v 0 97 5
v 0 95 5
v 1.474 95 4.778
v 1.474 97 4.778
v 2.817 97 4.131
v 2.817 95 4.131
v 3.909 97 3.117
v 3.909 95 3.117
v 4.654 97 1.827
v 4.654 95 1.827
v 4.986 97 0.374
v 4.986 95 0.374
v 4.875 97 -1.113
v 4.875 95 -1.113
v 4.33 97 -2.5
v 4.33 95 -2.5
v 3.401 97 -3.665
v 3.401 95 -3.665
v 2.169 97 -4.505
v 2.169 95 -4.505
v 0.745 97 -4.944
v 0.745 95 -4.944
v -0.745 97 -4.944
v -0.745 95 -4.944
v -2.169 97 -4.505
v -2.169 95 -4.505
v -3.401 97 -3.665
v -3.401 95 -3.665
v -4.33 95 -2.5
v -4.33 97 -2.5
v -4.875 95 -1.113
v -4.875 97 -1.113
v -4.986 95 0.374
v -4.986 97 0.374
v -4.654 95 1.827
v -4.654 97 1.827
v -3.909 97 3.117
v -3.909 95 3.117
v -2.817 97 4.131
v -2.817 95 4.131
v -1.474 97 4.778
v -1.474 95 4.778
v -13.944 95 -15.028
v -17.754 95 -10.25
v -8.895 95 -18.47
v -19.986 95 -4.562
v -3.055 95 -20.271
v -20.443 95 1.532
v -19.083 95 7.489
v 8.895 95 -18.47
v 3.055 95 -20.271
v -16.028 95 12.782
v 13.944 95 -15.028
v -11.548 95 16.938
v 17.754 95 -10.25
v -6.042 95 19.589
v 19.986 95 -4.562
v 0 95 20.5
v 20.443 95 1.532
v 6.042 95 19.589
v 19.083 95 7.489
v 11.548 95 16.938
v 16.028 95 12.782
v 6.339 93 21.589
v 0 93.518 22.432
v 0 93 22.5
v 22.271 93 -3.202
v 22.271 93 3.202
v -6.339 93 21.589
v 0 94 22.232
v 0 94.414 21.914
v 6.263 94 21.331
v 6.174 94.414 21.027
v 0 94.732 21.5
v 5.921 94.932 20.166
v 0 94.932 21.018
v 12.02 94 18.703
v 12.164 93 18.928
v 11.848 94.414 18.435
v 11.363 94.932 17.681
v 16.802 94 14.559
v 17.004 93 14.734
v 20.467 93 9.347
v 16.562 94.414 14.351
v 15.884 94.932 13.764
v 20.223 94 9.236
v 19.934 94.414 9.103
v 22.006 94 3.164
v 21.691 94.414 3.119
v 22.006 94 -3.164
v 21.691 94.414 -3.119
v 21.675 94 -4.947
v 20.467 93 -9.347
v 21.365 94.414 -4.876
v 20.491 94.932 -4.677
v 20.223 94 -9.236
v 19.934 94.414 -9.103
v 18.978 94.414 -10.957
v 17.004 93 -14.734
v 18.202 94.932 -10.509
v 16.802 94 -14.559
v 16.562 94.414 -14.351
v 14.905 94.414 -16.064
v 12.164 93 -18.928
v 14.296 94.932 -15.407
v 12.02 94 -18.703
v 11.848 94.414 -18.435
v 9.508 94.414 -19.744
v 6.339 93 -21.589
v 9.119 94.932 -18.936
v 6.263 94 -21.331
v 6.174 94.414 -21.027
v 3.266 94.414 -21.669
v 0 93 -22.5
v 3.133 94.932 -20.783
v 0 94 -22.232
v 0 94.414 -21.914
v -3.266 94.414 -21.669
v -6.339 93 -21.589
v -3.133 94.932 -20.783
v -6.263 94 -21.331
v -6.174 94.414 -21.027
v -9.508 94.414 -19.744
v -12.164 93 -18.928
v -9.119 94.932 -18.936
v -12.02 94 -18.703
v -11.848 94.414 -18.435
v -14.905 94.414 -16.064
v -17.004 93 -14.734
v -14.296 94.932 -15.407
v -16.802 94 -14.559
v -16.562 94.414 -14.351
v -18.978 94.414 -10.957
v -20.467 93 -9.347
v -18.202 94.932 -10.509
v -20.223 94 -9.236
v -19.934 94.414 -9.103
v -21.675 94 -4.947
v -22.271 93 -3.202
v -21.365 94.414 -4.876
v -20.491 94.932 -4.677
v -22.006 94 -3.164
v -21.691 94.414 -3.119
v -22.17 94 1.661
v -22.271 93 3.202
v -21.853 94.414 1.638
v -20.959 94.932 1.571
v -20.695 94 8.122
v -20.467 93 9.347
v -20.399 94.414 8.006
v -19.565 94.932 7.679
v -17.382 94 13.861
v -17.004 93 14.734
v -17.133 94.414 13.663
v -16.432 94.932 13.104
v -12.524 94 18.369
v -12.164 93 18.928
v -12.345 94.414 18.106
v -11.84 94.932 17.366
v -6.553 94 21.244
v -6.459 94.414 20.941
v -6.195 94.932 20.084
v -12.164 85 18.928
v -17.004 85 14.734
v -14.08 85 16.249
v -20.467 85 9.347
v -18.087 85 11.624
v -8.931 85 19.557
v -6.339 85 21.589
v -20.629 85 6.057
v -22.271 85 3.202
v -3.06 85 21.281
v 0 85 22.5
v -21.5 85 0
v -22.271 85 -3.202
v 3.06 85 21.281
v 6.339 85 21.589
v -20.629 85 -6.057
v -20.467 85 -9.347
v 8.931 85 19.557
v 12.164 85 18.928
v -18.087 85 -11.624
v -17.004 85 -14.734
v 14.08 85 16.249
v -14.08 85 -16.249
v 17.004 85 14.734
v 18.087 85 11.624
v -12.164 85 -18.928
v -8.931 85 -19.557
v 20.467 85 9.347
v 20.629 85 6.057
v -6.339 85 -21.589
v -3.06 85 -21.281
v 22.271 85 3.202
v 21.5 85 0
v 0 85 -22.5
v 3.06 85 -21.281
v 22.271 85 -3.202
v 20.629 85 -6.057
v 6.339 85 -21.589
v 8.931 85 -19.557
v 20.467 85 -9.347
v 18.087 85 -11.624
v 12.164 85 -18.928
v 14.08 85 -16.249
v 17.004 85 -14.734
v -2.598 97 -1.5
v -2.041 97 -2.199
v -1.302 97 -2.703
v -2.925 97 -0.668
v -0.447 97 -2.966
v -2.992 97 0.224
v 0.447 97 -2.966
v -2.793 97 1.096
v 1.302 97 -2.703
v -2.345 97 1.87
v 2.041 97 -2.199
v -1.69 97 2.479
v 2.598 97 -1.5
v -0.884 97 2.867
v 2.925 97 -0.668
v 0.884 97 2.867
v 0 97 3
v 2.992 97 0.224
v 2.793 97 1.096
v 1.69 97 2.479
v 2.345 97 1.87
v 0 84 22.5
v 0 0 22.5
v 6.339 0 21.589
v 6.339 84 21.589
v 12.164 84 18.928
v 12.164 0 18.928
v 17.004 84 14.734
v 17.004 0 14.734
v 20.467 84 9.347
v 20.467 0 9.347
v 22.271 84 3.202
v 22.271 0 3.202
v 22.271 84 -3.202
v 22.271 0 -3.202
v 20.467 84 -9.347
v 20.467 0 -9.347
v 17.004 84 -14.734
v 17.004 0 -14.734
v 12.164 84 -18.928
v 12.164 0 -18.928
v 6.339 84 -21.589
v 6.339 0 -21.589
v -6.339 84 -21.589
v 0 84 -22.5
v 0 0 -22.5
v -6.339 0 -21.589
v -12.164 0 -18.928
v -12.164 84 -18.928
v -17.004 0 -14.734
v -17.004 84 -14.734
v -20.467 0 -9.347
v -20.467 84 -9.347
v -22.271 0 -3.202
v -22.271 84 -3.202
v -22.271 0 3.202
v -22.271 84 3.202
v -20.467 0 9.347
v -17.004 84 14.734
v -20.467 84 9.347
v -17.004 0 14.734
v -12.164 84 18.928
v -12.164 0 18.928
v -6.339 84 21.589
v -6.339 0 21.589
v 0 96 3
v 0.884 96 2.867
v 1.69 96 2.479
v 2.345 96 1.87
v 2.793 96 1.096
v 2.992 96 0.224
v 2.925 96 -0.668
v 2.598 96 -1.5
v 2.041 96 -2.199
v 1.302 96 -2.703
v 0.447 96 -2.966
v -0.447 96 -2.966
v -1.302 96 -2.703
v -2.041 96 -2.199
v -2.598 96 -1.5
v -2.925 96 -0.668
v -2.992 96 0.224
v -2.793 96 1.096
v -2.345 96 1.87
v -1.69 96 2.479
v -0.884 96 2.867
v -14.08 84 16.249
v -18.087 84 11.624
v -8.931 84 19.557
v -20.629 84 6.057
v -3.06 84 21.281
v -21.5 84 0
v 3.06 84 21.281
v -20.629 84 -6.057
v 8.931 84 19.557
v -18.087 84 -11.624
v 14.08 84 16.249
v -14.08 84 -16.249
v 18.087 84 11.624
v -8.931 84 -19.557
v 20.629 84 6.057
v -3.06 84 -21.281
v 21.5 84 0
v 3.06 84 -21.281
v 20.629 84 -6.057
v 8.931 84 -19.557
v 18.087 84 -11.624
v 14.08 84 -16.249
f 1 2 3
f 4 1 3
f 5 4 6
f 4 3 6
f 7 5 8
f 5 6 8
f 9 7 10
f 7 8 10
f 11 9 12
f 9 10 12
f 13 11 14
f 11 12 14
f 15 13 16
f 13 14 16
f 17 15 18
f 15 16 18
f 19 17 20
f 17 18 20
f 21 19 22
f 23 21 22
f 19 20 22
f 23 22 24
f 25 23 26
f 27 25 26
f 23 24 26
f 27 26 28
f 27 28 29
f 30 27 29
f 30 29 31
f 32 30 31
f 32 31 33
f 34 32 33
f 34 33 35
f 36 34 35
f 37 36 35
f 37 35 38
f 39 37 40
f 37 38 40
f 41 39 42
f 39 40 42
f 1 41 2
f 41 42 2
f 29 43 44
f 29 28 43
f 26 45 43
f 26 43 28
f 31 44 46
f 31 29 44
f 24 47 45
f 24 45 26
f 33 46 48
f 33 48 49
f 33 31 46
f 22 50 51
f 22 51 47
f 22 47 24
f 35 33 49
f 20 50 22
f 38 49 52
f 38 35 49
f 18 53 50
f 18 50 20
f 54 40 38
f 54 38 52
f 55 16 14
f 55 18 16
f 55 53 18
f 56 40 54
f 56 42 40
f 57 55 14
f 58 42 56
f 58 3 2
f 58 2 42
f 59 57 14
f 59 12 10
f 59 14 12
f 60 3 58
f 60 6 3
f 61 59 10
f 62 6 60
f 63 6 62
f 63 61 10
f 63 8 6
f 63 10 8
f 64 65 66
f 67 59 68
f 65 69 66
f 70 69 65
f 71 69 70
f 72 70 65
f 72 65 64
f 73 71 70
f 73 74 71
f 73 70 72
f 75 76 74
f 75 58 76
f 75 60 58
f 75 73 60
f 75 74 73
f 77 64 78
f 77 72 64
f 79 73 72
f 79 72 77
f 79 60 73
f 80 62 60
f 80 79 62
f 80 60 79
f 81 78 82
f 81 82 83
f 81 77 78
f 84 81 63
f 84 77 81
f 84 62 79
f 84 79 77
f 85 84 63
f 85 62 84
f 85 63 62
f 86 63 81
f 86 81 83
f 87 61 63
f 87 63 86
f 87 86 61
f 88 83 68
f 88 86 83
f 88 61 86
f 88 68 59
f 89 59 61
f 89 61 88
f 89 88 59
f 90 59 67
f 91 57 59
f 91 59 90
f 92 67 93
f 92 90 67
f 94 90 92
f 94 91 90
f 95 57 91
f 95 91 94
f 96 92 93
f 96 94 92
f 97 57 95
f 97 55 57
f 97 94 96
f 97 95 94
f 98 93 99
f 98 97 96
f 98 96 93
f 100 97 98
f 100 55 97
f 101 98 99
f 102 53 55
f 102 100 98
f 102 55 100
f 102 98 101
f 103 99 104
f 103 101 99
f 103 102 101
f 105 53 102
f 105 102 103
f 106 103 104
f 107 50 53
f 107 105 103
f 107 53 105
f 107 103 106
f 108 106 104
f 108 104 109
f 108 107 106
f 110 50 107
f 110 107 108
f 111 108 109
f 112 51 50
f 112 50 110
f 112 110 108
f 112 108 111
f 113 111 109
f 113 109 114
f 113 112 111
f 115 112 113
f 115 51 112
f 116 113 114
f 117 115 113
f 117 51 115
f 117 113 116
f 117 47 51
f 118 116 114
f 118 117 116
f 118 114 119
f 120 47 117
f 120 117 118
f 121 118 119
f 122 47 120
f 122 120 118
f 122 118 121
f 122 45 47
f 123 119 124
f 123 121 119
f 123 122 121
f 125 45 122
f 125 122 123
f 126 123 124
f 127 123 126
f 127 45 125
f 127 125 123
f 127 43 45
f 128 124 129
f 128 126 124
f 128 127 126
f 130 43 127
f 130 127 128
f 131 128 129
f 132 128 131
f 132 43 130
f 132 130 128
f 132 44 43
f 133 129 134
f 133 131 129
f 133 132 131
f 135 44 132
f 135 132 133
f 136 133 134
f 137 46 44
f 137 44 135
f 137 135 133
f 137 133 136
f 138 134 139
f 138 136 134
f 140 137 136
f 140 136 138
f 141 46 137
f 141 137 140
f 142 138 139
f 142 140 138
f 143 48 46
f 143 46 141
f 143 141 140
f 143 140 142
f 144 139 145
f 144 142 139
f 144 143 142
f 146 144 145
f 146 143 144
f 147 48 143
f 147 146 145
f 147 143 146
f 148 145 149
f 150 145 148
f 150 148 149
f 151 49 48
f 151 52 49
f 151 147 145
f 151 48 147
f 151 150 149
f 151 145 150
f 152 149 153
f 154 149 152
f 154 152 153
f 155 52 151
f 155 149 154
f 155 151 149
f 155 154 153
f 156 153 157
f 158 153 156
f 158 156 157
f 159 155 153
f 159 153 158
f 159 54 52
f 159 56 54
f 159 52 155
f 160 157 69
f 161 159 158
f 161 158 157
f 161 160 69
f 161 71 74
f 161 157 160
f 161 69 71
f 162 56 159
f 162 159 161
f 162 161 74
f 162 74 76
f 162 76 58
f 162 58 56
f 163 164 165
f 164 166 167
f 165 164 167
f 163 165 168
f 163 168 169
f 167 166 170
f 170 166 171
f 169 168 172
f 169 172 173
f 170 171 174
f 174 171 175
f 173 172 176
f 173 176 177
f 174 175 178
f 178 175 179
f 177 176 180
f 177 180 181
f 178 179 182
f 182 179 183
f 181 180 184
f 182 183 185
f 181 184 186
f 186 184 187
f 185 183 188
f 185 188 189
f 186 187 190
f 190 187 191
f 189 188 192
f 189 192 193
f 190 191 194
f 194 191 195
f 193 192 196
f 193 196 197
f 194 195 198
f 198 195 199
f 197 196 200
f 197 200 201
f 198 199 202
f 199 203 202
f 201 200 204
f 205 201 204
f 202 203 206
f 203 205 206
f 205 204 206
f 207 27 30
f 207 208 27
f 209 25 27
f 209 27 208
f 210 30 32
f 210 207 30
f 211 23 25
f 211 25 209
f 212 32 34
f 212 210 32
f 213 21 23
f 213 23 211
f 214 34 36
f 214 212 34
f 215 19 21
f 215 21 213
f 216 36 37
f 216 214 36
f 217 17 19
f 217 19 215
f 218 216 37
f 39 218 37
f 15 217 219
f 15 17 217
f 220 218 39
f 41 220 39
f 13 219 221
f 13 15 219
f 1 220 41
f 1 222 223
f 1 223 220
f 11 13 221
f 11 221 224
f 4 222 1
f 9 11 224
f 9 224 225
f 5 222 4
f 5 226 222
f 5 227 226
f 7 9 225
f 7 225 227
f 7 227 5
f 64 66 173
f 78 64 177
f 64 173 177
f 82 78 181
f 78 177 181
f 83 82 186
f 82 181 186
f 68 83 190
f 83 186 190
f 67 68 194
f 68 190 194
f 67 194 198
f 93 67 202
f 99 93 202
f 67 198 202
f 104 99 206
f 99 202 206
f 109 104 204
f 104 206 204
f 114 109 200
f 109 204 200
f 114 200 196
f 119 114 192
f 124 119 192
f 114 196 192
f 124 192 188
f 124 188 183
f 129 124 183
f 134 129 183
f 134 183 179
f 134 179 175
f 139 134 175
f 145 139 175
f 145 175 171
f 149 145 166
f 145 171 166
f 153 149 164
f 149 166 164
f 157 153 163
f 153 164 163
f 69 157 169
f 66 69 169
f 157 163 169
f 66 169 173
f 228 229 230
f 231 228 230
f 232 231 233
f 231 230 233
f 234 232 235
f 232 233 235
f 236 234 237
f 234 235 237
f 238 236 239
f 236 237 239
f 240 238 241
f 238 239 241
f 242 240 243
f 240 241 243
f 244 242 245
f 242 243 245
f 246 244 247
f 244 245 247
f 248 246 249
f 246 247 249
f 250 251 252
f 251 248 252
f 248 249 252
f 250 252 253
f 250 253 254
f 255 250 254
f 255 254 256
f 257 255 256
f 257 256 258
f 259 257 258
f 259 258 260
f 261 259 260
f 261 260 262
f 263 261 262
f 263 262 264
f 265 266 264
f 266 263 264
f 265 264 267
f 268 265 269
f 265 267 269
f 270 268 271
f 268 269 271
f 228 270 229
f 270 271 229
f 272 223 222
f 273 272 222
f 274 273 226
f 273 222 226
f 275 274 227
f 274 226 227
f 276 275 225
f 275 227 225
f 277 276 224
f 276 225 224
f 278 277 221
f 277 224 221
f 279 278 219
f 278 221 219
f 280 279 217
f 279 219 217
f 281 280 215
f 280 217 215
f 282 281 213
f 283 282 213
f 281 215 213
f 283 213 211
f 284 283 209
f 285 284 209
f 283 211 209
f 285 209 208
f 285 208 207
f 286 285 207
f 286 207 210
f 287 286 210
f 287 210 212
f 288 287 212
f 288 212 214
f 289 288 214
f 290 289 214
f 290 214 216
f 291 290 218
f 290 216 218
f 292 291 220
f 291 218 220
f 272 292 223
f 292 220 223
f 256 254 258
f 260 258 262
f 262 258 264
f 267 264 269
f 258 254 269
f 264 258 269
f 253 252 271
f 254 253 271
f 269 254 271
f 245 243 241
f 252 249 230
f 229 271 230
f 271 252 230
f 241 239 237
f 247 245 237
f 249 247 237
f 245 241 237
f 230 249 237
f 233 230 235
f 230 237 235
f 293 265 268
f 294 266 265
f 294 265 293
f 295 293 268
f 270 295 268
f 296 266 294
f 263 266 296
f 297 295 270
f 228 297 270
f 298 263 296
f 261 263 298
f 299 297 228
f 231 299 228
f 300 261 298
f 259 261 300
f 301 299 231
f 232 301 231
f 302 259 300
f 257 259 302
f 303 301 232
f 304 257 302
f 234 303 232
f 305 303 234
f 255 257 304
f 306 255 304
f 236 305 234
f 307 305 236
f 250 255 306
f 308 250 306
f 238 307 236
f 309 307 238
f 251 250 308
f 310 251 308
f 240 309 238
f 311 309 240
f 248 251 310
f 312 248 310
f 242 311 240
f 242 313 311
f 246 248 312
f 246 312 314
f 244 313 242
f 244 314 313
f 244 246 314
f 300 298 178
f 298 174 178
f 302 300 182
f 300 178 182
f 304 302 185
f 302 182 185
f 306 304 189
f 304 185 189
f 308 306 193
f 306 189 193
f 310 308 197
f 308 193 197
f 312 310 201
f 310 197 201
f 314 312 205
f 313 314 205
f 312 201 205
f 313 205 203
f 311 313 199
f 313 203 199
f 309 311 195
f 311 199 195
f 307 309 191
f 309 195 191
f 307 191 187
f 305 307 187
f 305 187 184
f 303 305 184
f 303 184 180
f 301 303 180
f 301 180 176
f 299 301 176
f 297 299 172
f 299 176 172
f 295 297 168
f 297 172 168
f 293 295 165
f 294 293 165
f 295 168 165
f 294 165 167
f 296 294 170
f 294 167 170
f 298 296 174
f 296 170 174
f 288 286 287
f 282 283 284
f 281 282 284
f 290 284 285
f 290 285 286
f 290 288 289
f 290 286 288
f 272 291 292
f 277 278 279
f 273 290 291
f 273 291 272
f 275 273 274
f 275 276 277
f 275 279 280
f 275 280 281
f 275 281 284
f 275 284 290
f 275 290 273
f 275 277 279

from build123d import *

# Parameters (mm, degrees)
SKETCH_1_R          = 22.5
EXTRUDE_1_DEPTH     = 95
SKETCH_2_W          = 1
SKETCH_2_H          = 1
FILLET_1_R          = 2
SKETCH_3_R          = 5
EXTRUDE_2_DEPTH     = 2
SKETCH_4_R          = 3
CUT_EXTRUDE_1_DEPTH = 1


with BuildPart() as part:
    # Эскиз1 → Бобышка-Вытянуть1 (new body)
    with BuildSketch(Plane(origin=(0, 0, 0), x_dir=(1, 0, 0), z_dir=(0, 1, 0))):
        with Locations(Location((0, 0, 0), (0, 0, 270))):
            Circle(SKETCH_1_R)
    extrude(amount=EXTRUDE_1_DEPTH)

    # Эскиз2 → Вырез-Повернуть1 (revolve, cut)
    with BuildSketch(Plane.XY, mode=Mode.PRIVATE) as cut_revolve_1_sk:
        with Locations((22, 84.5)):
            Rectangle(SKETCH_2_W, SKETCH_2_H)
    revolve(cut_revolve_1_sk.sketch.rotate(Axis((0, 95, 0), (0, -1, 0)), 180), axis=Axis((0, 95, 0), (0, -1, 0)), mode=Mode.SUBTRACT)

    # Скругление1
    fillet_1_edges = [part.edges().sort_by_distance(p)[0] for p in [
        (0, 95, -22.5),
    ]]
    fillet(fillet_1_edges, radius=FILLET_1_R)

    # Эскиз3 → Бобышка-Вытянуть2 (add)
    with BuildSketch(Plane(origin=(0, 95, 0), x_dir=(1, 0, 0), z_dir=(0, 1, 0))):
        with Locations(Location((0, 0, 0), (0, 0, 270))):
            Circle(SKETCH_3_R)
    extrude(amount=EXTRUDE_2_DEPTH)

    # Эскиз4 → Вырез-Вытянуть1 (cut)
    with BuildSketch(Plane(origin=(0, 97, 0), x_dir=(1, 0, 0), z_dir=(0, 1, 0))):
        with Locations(Location((0, 0, 0), (0, 0, 270))):
            Circle(SKETCH_4_R)
    extrude(amount=-CUT_EXTRUDE_1_DEPTH, mode=Mode.SUBTRACT)


solid = part.part
